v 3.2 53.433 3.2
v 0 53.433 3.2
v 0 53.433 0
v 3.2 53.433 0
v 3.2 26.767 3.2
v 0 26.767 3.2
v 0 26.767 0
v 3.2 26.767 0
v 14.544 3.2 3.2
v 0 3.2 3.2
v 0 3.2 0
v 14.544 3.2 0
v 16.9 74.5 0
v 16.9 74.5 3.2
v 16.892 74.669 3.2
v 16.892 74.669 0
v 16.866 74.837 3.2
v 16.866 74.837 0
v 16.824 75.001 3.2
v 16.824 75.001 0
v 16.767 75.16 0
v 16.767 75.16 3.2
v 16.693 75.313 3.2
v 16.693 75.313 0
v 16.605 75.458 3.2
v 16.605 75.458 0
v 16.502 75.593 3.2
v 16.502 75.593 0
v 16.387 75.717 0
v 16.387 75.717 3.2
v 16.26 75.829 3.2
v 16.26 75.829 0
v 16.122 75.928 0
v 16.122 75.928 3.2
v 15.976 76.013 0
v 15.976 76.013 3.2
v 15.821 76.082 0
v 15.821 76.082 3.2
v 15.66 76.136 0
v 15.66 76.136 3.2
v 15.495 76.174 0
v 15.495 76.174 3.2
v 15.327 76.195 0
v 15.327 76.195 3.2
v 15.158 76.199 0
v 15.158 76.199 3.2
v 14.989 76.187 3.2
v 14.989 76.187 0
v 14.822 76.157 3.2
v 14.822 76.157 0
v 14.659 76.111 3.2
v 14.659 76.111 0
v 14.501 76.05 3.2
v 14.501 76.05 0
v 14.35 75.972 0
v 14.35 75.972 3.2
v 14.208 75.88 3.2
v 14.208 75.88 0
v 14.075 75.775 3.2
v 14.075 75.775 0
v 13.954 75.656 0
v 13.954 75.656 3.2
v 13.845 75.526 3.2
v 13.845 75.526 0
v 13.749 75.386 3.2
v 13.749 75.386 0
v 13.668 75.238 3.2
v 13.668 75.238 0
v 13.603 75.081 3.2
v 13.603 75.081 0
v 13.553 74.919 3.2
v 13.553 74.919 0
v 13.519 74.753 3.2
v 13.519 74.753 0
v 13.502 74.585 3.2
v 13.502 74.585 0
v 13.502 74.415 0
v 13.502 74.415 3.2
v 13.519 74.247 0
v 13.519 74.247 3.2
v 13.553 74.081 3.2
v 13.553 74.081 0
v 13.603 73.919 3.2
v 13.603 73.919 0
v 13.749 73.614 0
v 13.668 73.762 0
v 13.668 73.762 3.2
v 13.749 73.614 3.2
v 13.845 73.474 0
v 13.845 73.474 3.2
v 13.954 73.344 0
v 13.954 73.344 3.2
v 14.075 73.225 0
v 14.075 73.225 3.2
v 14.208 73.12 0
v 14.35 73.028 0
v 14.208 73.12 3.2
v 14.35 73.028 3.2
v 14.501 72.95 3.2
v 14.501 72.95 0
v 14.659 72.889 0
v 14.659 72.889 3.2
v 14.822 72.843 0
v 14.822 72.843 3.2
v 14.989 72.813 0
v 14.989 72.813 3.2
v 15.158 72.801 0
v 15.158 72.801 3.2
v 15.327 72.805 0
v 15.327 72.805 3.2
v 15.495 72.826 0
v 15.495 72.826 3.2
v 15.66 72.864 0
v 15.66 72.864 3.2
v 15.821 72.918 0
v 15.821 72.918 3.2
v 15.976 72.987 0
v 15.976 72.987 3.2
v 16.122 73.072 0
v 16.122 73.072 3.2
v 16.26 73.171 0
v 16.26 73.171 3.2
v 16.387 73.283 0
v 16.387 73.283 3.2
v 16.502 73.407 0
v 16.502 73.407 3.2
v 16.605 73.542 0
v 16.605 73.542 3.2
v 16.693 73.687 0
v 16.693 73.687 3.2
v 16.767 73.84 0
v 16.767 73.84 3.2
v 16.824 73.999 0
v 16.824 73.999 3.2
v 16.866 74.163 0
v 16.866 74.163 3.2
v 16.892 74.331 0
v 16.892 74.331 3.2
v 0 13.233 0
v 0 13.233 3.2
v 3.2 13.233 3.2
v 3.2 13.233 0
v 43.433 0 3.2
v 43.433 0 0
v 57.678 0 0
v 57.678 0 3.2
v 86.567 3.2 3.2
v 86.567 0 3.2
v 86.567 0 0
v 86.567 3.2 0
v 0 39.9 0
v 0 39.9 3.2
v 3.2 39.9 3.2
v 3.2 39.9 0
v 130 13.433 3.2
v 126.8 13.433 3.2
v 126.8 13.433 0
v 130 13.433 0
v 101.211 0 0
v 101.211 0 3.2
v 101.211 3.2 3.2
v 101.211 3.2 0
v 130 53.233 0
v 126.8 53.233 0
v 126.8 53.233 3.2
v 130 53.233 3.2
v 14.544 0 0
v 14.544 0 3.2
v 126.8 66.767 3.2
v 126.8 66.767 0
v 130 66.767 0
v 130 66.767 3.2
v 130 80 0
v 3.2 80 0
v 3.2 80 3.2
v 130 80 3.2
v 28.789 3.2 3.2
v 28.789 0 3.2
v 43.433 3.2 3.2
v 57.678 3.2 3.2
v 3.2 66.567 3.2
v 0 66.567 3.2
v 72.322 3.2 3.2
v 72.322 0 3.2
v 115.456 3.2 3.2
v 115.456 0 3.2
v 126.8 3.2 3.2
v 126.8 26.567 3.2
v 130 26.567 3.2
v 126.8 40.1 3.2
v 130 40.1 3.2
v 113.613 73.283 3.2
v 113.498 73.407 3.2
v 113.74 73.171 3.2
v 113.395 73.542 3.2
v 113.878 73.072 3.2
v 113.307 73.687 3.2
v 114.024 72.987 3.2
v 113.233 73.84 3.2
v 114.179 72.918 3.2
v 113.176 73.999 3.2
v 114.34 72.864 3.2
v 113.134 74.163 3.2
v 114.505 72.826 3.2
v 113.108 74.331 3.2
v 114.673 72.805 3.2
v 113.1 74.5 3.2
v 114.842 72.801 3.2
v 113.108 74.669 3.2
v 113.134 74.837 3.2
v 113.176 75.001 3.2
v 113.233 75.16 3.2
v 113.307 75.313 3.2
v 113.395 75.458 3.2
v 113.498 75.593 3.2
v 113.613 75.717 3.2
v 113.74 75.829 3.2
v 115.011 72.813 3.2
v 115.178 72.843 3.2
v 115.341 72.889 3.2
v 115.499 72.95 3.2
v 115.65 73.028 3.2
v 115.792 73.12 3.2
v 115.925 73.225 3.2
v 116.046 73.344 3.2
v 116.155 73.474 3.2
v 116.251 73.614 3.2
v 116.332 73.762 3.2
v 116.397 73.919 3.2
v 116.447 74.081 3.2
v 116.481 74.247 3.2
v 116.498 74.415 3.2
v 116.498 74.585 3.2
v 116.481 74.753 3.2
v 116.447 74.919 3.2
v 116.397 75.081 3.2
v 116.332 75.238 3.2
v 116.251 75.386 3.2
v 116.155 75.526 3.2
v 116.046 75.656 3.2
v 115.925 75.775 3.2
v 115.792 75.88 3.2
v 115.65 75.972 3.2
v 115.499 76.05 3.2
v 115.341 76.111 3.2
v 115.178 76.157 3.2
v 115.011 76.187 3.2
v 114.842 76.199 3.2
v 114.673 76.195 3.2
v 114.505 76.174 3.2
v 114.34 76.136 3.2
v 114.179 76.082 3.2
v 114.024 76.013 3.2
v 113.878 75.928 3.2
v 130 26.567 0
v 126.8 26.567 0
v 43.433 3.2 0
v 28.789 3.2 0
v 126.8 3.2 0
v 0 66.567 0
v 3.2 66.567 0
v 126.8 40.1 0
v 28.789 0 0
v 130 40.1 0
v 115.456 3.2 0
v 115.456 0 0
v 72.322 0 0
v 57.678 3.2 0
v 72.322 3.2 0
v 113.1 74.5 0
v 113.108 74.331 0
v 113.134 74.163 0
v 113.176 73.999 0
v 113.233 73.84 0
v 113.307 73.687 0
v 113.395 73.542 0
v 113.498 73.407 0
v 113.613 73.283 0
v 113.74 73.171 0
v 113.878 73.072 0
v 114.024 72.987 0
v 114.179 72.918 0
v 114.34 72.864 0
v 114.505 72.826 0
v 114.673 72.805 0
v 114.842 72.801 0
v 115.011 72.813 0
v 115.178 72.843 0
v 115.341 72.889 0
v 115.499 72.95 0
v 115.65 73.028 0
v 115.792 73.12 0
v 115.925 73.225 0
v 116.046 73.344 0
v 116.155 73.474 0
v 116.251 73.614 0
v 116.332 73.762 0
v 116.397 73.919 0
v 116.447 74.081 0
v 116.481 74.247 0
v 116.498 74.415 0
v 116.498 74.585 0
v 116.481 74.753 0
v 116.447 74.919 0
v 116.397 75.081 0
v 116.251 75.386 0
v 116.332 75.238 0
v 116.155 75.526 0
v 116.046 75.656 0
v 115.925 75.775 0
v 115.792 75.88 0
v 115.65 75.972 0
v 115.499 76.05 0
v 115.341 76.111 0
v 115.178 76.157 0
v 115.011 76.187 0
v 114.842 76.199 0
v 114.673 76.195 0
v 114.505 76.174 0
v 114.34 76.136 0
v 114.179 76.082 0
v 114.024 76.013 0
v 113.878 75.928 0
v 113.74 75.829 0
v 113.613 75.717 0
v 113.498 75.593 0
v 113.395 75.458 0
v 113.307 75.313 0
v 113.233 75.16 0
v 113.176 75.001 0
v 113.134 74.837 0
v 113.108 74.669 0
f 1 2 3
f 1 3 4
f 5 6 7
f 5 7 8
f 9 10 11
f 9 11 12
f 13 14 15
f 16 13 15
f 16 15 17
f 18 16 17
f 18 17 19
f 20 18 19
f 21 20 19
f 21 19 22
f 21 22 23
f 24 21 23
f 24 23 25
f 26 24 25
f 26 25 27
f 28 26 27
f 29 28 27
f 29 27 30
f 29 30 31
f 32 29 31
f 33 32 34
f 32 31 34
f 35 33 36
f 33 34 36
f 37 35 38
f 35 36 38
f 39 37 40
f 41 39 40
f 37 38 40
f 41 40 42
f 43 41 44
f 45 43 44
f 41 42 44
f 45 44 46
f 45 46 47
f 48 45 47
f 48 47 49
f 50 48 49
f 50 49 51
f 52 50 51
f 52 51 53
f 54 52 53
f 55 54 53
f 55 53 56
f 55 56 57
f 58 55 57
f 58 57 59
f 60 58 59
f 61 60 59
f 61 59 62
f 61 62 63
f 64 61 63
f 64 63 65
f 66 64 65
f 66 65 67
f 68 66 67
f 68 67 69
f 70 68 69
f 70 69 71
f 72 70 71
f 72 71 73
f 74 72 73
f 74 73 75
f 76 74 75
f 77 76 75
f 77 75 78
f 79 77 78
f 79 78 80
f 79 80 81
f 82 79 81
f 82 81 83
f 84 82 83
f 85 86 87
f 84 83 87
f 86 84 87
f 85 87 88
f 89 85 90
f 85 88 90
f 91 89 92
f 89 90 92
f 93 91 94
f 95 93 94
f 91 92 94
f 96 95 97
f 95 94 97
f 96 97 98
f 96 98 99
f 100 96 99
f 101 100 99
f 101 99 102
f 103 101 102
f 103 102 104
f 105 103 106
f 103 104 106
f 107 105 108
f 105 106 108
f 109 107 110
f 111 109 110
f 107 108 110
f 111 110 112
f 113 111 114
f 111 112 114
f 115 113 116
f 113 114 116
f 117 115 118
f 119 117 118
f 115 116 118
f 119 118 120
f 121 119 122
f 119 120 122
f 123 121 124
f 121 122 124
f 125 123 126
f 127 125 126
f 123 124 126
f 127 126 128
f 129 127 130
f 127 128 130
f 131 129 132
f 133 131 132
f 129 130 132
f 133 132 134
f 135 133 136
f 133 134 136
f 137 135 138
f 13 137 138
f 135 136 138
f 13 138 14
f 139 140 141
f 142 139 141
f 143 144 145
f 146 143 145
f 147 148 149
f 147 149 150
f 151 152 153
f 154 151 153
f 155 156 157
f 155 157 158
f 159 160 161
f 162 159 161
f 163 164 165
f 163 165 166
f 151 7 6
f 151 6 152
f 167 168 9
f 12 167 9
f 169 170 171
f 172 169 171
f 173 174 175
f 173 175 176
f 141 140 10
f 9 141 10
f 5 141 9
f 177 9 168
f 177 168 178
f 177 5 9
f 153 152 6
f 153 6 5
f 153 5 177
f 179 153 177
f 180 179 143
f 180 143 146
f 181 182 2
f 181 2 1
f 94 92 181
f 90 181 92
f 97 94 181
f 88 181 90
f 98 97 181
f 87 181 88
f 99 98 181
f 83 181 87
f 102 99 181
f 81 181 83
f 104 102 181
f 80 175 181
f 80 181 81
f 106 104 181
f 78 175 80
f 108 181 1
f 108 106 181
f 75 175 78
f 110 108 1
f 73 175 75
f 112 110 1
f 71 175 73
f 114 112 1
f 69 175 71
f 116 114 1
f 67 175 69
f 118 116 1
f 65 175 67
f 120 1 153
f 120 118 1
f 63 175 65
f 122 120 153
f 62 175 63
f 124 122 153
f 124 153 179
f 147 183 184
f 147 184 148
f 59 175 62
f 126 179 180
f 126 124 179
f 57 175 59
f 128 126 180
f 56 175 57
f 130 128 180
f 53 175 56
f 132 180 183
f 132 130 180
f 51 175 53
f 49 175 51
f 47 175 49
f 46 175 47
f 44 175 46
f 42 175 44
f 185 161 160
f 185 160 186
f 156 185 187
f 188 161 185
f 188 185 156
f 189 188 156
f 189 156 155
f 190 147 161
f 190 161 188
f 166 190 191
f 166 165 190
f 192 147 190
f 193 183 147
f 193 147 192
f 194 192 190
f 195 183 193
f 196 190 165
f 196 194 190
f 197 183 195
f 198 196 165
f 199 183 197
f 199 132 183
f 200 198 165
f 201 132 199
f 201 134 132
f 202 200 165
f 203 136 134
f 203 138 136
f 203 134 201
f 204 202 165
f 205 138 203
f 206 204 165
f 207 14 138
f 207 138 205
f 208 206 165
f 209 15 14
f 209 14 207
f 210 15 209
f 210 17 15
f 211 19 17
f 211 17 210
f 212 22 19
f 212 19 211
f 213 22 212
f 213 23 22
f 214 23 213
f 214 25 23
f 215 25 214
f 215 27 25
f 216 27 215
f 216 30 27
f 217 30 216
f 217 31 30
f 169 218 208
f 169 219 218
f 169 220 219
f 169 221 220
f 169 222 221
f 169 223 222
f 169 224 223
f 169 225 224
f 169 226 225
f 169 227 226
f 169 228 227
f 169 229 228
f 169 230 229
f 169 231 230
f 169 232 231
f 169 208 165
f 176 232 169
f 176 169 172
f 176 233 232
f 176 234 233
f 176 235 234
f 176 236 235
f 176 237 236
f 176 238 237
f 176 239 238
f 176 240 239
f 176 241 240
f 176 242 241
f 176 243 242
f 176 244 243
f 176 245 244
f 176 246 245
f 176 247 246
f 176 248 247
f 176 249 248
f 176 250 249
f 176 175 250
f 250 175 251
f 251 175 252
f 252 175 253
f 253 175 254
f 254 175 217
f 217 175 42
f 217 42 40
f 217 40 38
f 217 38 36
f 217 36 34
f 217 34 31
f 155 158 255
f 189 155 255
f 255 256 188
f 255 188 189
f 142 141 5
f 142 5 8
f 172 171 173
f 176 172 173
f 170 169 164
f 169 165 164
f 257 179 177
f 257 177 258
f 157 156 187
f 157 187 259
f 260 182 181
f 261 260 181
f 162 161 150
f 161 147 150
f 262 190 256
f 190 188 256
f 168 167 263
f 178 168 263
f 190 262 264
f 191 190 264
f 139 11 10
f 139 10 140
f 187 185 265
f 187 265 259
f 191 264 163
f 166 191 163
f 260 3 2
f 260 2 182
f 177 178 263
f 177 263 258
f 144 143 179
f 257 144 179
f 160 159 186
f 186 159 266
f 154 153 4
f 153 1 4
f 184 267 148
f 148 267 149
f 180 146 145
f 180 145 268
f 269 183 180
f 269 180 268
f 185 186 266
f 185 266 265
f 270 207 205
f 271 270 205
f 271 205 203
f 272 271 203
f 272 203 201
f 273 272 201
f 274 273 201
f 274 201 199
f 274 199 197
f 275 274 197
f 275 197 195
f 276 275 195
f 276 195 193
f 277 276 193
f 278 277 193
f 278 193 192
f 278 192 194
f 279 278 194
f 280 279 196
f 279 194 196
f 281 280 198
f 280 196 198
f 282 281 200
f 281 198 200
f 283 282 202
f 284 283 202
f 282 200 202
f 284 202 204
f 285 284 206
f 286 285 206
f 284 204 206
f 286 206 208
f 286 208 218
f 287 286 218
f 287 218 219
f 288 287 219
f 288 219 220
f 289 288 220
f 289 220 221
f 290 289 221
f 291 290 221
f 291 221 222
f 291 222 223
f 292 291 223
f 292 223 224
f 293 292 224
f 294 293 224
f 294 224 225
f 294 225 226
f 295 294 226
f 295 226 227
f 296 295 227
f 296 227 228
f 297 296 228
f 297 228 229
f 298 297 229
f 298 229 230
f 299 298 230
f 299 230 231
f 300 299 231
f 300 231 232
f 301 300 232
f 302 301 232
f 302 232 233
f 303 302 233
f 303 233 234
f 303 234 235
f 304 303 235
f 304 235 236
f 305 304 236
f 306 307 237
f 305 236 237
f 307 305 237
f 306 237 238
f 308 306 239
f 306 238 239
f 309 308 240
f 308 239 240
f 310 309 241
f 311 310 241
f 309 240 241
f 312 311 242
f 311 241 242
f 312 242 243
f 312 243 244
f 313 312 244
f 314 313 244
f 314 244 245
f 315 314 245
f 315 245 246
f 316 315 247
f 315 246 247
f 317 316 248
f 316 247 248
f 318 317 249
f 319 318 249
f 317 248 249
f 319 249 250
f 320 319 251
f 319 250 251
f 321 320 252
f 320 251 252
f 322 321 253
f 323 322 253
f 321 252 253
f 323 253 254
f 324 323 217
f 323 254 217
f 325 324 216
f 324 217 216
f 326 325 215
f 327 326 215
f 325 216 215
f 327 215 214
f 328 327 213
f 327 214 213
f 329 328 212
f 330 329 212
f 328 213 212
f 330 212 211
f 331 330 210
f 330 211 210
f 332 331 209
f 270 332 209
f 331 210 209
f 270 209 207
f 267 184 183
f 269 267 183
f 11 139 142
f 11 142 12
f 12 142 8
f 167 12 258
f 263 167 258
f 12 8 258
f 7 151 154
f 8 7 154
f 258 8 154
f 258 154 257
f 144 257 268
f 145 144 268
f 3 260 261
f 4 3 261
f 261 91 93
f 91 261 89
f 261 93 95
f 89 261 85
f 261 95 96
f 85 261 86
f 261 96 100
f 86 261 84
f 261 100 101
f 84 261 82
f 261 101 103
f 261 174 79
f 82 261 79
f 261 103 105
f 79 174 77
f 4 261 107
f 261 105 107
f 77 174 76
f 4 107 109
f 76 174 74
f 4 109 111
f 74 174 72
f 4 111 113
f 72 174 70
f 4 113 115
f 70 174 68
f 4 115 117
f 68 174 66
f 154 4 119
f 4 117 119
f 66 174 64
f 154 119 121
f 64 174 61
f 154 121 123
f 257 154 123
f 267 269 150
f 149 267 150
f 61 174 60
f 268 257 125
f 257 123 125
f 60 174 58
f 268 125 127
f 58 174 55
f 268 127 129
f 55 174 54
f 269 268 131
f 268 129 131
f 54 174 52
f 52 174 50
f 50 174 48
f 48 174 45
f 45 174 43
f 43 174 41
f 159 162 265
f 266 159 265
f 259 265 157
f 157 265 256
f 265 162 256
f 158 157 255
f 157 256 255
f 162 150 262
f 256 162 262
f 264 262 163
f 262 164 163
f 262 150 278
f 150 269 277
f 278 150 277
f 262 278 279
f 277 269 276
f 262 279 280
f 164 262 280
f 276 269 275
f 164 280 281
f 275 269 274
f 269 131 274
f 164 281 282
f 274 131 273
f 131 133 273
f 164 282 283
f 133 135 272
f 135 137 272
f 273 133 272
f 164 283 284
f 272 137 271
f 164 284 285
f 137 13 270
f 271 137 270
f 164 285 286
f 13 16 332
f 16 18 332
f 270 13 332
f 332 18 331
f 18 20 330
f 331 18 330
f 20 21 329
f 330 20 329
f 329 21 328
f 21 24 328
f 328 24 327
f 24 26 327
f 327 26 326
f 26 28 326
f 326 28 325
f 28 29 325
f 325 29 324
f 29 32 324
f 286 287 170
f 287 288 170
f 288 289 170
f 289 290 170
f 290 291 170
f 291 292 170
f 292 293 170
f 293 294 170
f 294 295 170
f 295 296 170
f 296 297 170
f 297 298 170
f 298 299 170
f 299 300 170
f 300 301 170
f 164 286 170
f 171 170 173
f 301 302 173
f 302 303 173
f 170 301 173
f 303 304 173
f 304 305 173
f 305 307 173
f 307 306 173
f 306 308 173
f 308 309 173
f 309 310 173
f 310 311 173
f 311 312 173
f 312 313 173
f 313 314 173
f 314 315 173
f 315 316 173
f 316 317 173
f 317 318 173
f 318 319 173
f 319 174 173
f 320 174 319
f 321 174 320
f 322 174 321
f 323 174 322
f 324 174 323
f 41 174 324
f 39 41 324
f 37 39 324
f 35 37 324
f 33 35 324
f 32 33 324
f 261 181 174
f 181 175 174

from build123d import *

# Parameters (mm, degrees)
SKETCH1_W           = 130
SKETCH1_H           = 80
BOSS_EXTRUDE1_DEPTH = 3.2
SKETCH2_W           = 14.444444444
SKETCH2_H           = 3.2
SKETCH2_W_2         = 3.2
SKETCH2_H_2         = 13.333333334
SKETCH2_H_3         = 13.333333333
CUT_EXTRUDE1_DEPTH  = 153.676913775
MOVE_FACE1_BY       = 0.1
MOVE_FACE1_2_BY     = 0.1
MOVE_FACE1_3_BY     = 0.1
MOVE_FACE1_4_BY     = 0.1
MOVE_FACE1_5_BY     = 0.1
MOVE_FACE1_6_BY     = 0.1
MOVE_FACE1_7_BY     = 0.1
MOVE_FACE1_8_BY     = 0.1
MOVE_FACE1_9_BY     = 0.1
MOVE_FACE1_10_BY    = 0.1
MOVE_FACE1_11_BY    = 0.1
MOVE_FACE1_12_BY    = 0.1
MOVE_FACE1_13_BY    = 0.1
MOVE_FACE1_14_BY    = 0.1
MOVE_FACE1_15_BY    = 0.1
MOVE_FACE1_16_BY    = 0.1
MOVE_FACE1_17_BY    = 0.1
MOVE_FACE1_18_BY    = 0.1
CUT_EXTRUDE2_REACH  = 154.677
SKETCH3_R           = 1.7


with BuildPart() as part:
    # Sketch1 → Boss-Extrude1 (new body)
    with BuildSketch(Plane.XY):
        with Locations((65, 40)):
            Rectangle(SKETCH1_W, SKETCH1_H)
    extrude(amount=BOSS_EXTRUDE1_DEPTH)

    # Sketch2 → Cut-Extrude1 (cut, through all)
    with BuildSketch(Plane.XY.offset(3.2)):
        with Locations((7.222222222, 1.6)):
            Rectangle(SKETCH2_W, SKETCH2_H)
        with Locations((36.111111111, 1.6)):
            Rectangle(SKETCH2_W, SKETCH2_H)
        with Locations((65, 1.6)):
            Rectangle(SKETCH2_W, SKETCH2_H)
        with Locations((93.888888889, 1.6)):
            Rectangle(SKETCH2_W, SKETCH2_H)
        Polygon((115.555555556, 0), (115.555555556, 3.2), (126.8, 3.2), (126.8, 13.333333333), (130, 13.333333333), (130, 0), align=None)
        with Locations((1.6, 20)):
            Rectangle(SKETCH2_W_2, SKETCH2_H_2)
        with Locations((1.6, 46.666666667)):
            Rectangle(SKETCH2_W_2, SKETCH2_H_3)
        with Locations((1.6, 73.333333334)):
            Rectangle(SKETCH2_W_2, SKETCH2_H_3)
        with Locations((128.4, 33.333333334)):
            Rectangle(SKETCH2_W_2, SKETCH2_H_3)
        with Locations((128.4, 60)):
            Rectangle(SKETCH2_W_2, SKETCH2_H_2)
    extrude(amount=-CUT_EXTRUDE1_DEPTH, mode=Mode.SUBTRACT)

    # Move Face1: a face moved inward by 0.1
    extrude(part.faces().sort_by_distance((128.4, 53.333333333, 1.6))[0], amount=MOVE_FACE1_BY, dir=(0, -1, 0), mode=Mode.SUBTRACT)

    # Move Face1 2: a face moved inward by 0.1
    extrude(part.faces().sort_by_distance((128.4, 26.666666667, 1.6))[0], amount=MOVE_FACE1_2_BY, dir=(0, -1, 0), mode=Mode.SUBTRACT)

    # Move Face1 3: a face moved inward by 0.1
    extrude(part.faces().sort_by_distance((128.4, 13.333333333, 1.6))[0], amount=MOVE_FACE1_3_BY, dir=(0, 1, 0), mode=Mode.SUBTRACT)

    # Move Face1 4: a face moved inward by 0.1
    extrude(part.faces().sort_by_distance((128.4, 40, 1.6))[0], amount=MOVE_FACE1_4_BY, dir=(0, 1, 0), mode=Mode.SUBTRACT)

    # Move Face1 5: a face moved inward by 0.1
    extrude(part.faces().sort_by_distance((128.4, 66.666666667, 1.6))[0], amount=MOVE_FACE1_5_BY, dir=(0, 1, 0), mode=Mode.SUBTRACT)

    # Move Face1 6: a face moved inward by 0.1
    extrude(part.faces().sort_by_distance((115.555555556, 1.6, 1.6))[0], amount=MOVE_FACE1_6_BY, dir=(-1, 0, 0), mode=Mode.SUBTRACT)

    # Move Face1 7: a face moved inward by 0.1
    extrude(part.faces().sort_by_distance((86.666666667, 1.6, 1.6))[0], amount=MOVE_FACE1_7_BY, dir=(-1, 0, 0), mode=Mode.SUBTRACT)

    # Move Face1 8: a face moved inward by 0.1
    extrude(part.faces().sort_by_distance((57.777777778, 1.6, 1.6))[0], amount=MOVE_FACE1_8_BY, dir=(-1, 0, 0), mode=Mode.SUBTRACT)

    # Move Face1 9: a face moved inward by 0.1
    extrude(part.faces().sort_by_distance((28.888888889, 1.6, 1.6))[0], amount=MOVE_FACE1_9_BY, dir=(-1, 0, 0), mode=Mode.SUBTRACT)

    # Move Face1 10: a face moved inward by 0.1
    extrude(part.faces().sort_by_distance((14.444444444, 1.6, 1.6))[0], amount=MOVE_FACE1_10_BY, dir=(1, 0, 0), mode=Mode.SUBTRACT)

    # Move Face1 11: a face moved inward by 0.1
    extrude(part.faces().sort_by_distance((43.333333333, 1.6, 1.6))[0], amount=MOVE_FACE1_11_BY, dir=(1, 0, 0), mode=Mode.SUBTRACT)

    # Move Face1 12: a face moved inward by 0.1
    extrude(part.faces().sort_by_distance((72.222222222, 1.6, 1.6))[0], amount=MOVE_FACE1_12_BY, dir=(1, 0, 0), mode=Mode.SUBTRACT)

    # Move Face1 13: a face moved inward by 0.1
    extrude(part.faces().sort_by_distance((101.111111111, 1.6, 1.6))[0], amount=MOVE_FACE1_13_BY, dir=(1, 0, 0), mode=Mode.SUBTRACT)

    # Move Face1 14: a face moved inward by 0.1
    extrude(part.faces().sort_by_distance((1.6, 26.666666667, 1.6))[0], amount=MOVE_FACE1_14_BY, dir=(0, 1, 0), mode=Mode.SUBTRACT)

    # Move Face1 15: a face moved inward by 0.1
    extrude(part.faces().sort_by_distance((1.6, 13.333333333, 1.6))[0], amount=MOVE_FACE1_15_BY, dir=(0, -1, 0), mode=Mode.SUBTRACT)

    # Move Face1 16: a face moved inward by 0.1
    extrude(part.faces().sort_by_distance((1.6, 40, 1.6))[0], amount=MOVE_FACE1_16_BY, dir=(0, -1, 0), mode=Mode.SUBTRACT)

    # Move Face1 17: a face moved inward by 0.1
    extrude(part.faces().sort_by_distance((1.6, 53.333333333, 1.6))[0], amount=MOVE_FACE1_17_BY, dir=(0, 1, 0), mode=Mode.SUBTRACT)

    # Move Face1 18: a face moved inward by 0.1
    extrude(part.faces().sort_by_distance((1.6, 66.666666667, 1.6))[0], amount=MOVE_FACE1_18_BY, dir=(0, -1, 0), mode=Mode.SUBTRACT)

    # Sketch3 → Cut-Extrude2 (cut, up to next)
    with BuildSketch(Plane.XY.offset(3.2), mode=Mode.PRIVATE) as cut_extrude2_sk1:
        with Locations((15.2, 74.5)):
            Circle(SKETCH3_R)
    cut_extrude2_tool1 = extrude(cut_extrude2_sk1.sketch, amount=-CUT_EXTRUDE2_REACH, mode=Mode.PRIVATE) & part.part
    # Sketch3 → Cut-Extrude2 (cut, up to next)
    with BuildSketch(Plane.XY.offset(3.2), mode=Mode.PRIVATE) as cut_extrude2_sk2:
        with Locations(Location((114.8, 74.5, 0), (0, 0, 180))):
            Circle(SKETCH3_R)
    cut_extrude2_tool2 = extrude(cut_extrude2_sk2.sketch, amount=-CUT_EXTRUDE2_REACH, mode=Mode.PRIVATE) & part.part
    add(cut_extrude2_tool1.solids().sort_by_distance((15.2, 74.5, 3.2))[0], mode=Mode.SUBTRACT)
    add(cut_extrude2_tool2.solids().sort_by_distance((114.8, 74.5, 3.2))[0], mode=Mode.SUBTRACT)


solid = part.part
